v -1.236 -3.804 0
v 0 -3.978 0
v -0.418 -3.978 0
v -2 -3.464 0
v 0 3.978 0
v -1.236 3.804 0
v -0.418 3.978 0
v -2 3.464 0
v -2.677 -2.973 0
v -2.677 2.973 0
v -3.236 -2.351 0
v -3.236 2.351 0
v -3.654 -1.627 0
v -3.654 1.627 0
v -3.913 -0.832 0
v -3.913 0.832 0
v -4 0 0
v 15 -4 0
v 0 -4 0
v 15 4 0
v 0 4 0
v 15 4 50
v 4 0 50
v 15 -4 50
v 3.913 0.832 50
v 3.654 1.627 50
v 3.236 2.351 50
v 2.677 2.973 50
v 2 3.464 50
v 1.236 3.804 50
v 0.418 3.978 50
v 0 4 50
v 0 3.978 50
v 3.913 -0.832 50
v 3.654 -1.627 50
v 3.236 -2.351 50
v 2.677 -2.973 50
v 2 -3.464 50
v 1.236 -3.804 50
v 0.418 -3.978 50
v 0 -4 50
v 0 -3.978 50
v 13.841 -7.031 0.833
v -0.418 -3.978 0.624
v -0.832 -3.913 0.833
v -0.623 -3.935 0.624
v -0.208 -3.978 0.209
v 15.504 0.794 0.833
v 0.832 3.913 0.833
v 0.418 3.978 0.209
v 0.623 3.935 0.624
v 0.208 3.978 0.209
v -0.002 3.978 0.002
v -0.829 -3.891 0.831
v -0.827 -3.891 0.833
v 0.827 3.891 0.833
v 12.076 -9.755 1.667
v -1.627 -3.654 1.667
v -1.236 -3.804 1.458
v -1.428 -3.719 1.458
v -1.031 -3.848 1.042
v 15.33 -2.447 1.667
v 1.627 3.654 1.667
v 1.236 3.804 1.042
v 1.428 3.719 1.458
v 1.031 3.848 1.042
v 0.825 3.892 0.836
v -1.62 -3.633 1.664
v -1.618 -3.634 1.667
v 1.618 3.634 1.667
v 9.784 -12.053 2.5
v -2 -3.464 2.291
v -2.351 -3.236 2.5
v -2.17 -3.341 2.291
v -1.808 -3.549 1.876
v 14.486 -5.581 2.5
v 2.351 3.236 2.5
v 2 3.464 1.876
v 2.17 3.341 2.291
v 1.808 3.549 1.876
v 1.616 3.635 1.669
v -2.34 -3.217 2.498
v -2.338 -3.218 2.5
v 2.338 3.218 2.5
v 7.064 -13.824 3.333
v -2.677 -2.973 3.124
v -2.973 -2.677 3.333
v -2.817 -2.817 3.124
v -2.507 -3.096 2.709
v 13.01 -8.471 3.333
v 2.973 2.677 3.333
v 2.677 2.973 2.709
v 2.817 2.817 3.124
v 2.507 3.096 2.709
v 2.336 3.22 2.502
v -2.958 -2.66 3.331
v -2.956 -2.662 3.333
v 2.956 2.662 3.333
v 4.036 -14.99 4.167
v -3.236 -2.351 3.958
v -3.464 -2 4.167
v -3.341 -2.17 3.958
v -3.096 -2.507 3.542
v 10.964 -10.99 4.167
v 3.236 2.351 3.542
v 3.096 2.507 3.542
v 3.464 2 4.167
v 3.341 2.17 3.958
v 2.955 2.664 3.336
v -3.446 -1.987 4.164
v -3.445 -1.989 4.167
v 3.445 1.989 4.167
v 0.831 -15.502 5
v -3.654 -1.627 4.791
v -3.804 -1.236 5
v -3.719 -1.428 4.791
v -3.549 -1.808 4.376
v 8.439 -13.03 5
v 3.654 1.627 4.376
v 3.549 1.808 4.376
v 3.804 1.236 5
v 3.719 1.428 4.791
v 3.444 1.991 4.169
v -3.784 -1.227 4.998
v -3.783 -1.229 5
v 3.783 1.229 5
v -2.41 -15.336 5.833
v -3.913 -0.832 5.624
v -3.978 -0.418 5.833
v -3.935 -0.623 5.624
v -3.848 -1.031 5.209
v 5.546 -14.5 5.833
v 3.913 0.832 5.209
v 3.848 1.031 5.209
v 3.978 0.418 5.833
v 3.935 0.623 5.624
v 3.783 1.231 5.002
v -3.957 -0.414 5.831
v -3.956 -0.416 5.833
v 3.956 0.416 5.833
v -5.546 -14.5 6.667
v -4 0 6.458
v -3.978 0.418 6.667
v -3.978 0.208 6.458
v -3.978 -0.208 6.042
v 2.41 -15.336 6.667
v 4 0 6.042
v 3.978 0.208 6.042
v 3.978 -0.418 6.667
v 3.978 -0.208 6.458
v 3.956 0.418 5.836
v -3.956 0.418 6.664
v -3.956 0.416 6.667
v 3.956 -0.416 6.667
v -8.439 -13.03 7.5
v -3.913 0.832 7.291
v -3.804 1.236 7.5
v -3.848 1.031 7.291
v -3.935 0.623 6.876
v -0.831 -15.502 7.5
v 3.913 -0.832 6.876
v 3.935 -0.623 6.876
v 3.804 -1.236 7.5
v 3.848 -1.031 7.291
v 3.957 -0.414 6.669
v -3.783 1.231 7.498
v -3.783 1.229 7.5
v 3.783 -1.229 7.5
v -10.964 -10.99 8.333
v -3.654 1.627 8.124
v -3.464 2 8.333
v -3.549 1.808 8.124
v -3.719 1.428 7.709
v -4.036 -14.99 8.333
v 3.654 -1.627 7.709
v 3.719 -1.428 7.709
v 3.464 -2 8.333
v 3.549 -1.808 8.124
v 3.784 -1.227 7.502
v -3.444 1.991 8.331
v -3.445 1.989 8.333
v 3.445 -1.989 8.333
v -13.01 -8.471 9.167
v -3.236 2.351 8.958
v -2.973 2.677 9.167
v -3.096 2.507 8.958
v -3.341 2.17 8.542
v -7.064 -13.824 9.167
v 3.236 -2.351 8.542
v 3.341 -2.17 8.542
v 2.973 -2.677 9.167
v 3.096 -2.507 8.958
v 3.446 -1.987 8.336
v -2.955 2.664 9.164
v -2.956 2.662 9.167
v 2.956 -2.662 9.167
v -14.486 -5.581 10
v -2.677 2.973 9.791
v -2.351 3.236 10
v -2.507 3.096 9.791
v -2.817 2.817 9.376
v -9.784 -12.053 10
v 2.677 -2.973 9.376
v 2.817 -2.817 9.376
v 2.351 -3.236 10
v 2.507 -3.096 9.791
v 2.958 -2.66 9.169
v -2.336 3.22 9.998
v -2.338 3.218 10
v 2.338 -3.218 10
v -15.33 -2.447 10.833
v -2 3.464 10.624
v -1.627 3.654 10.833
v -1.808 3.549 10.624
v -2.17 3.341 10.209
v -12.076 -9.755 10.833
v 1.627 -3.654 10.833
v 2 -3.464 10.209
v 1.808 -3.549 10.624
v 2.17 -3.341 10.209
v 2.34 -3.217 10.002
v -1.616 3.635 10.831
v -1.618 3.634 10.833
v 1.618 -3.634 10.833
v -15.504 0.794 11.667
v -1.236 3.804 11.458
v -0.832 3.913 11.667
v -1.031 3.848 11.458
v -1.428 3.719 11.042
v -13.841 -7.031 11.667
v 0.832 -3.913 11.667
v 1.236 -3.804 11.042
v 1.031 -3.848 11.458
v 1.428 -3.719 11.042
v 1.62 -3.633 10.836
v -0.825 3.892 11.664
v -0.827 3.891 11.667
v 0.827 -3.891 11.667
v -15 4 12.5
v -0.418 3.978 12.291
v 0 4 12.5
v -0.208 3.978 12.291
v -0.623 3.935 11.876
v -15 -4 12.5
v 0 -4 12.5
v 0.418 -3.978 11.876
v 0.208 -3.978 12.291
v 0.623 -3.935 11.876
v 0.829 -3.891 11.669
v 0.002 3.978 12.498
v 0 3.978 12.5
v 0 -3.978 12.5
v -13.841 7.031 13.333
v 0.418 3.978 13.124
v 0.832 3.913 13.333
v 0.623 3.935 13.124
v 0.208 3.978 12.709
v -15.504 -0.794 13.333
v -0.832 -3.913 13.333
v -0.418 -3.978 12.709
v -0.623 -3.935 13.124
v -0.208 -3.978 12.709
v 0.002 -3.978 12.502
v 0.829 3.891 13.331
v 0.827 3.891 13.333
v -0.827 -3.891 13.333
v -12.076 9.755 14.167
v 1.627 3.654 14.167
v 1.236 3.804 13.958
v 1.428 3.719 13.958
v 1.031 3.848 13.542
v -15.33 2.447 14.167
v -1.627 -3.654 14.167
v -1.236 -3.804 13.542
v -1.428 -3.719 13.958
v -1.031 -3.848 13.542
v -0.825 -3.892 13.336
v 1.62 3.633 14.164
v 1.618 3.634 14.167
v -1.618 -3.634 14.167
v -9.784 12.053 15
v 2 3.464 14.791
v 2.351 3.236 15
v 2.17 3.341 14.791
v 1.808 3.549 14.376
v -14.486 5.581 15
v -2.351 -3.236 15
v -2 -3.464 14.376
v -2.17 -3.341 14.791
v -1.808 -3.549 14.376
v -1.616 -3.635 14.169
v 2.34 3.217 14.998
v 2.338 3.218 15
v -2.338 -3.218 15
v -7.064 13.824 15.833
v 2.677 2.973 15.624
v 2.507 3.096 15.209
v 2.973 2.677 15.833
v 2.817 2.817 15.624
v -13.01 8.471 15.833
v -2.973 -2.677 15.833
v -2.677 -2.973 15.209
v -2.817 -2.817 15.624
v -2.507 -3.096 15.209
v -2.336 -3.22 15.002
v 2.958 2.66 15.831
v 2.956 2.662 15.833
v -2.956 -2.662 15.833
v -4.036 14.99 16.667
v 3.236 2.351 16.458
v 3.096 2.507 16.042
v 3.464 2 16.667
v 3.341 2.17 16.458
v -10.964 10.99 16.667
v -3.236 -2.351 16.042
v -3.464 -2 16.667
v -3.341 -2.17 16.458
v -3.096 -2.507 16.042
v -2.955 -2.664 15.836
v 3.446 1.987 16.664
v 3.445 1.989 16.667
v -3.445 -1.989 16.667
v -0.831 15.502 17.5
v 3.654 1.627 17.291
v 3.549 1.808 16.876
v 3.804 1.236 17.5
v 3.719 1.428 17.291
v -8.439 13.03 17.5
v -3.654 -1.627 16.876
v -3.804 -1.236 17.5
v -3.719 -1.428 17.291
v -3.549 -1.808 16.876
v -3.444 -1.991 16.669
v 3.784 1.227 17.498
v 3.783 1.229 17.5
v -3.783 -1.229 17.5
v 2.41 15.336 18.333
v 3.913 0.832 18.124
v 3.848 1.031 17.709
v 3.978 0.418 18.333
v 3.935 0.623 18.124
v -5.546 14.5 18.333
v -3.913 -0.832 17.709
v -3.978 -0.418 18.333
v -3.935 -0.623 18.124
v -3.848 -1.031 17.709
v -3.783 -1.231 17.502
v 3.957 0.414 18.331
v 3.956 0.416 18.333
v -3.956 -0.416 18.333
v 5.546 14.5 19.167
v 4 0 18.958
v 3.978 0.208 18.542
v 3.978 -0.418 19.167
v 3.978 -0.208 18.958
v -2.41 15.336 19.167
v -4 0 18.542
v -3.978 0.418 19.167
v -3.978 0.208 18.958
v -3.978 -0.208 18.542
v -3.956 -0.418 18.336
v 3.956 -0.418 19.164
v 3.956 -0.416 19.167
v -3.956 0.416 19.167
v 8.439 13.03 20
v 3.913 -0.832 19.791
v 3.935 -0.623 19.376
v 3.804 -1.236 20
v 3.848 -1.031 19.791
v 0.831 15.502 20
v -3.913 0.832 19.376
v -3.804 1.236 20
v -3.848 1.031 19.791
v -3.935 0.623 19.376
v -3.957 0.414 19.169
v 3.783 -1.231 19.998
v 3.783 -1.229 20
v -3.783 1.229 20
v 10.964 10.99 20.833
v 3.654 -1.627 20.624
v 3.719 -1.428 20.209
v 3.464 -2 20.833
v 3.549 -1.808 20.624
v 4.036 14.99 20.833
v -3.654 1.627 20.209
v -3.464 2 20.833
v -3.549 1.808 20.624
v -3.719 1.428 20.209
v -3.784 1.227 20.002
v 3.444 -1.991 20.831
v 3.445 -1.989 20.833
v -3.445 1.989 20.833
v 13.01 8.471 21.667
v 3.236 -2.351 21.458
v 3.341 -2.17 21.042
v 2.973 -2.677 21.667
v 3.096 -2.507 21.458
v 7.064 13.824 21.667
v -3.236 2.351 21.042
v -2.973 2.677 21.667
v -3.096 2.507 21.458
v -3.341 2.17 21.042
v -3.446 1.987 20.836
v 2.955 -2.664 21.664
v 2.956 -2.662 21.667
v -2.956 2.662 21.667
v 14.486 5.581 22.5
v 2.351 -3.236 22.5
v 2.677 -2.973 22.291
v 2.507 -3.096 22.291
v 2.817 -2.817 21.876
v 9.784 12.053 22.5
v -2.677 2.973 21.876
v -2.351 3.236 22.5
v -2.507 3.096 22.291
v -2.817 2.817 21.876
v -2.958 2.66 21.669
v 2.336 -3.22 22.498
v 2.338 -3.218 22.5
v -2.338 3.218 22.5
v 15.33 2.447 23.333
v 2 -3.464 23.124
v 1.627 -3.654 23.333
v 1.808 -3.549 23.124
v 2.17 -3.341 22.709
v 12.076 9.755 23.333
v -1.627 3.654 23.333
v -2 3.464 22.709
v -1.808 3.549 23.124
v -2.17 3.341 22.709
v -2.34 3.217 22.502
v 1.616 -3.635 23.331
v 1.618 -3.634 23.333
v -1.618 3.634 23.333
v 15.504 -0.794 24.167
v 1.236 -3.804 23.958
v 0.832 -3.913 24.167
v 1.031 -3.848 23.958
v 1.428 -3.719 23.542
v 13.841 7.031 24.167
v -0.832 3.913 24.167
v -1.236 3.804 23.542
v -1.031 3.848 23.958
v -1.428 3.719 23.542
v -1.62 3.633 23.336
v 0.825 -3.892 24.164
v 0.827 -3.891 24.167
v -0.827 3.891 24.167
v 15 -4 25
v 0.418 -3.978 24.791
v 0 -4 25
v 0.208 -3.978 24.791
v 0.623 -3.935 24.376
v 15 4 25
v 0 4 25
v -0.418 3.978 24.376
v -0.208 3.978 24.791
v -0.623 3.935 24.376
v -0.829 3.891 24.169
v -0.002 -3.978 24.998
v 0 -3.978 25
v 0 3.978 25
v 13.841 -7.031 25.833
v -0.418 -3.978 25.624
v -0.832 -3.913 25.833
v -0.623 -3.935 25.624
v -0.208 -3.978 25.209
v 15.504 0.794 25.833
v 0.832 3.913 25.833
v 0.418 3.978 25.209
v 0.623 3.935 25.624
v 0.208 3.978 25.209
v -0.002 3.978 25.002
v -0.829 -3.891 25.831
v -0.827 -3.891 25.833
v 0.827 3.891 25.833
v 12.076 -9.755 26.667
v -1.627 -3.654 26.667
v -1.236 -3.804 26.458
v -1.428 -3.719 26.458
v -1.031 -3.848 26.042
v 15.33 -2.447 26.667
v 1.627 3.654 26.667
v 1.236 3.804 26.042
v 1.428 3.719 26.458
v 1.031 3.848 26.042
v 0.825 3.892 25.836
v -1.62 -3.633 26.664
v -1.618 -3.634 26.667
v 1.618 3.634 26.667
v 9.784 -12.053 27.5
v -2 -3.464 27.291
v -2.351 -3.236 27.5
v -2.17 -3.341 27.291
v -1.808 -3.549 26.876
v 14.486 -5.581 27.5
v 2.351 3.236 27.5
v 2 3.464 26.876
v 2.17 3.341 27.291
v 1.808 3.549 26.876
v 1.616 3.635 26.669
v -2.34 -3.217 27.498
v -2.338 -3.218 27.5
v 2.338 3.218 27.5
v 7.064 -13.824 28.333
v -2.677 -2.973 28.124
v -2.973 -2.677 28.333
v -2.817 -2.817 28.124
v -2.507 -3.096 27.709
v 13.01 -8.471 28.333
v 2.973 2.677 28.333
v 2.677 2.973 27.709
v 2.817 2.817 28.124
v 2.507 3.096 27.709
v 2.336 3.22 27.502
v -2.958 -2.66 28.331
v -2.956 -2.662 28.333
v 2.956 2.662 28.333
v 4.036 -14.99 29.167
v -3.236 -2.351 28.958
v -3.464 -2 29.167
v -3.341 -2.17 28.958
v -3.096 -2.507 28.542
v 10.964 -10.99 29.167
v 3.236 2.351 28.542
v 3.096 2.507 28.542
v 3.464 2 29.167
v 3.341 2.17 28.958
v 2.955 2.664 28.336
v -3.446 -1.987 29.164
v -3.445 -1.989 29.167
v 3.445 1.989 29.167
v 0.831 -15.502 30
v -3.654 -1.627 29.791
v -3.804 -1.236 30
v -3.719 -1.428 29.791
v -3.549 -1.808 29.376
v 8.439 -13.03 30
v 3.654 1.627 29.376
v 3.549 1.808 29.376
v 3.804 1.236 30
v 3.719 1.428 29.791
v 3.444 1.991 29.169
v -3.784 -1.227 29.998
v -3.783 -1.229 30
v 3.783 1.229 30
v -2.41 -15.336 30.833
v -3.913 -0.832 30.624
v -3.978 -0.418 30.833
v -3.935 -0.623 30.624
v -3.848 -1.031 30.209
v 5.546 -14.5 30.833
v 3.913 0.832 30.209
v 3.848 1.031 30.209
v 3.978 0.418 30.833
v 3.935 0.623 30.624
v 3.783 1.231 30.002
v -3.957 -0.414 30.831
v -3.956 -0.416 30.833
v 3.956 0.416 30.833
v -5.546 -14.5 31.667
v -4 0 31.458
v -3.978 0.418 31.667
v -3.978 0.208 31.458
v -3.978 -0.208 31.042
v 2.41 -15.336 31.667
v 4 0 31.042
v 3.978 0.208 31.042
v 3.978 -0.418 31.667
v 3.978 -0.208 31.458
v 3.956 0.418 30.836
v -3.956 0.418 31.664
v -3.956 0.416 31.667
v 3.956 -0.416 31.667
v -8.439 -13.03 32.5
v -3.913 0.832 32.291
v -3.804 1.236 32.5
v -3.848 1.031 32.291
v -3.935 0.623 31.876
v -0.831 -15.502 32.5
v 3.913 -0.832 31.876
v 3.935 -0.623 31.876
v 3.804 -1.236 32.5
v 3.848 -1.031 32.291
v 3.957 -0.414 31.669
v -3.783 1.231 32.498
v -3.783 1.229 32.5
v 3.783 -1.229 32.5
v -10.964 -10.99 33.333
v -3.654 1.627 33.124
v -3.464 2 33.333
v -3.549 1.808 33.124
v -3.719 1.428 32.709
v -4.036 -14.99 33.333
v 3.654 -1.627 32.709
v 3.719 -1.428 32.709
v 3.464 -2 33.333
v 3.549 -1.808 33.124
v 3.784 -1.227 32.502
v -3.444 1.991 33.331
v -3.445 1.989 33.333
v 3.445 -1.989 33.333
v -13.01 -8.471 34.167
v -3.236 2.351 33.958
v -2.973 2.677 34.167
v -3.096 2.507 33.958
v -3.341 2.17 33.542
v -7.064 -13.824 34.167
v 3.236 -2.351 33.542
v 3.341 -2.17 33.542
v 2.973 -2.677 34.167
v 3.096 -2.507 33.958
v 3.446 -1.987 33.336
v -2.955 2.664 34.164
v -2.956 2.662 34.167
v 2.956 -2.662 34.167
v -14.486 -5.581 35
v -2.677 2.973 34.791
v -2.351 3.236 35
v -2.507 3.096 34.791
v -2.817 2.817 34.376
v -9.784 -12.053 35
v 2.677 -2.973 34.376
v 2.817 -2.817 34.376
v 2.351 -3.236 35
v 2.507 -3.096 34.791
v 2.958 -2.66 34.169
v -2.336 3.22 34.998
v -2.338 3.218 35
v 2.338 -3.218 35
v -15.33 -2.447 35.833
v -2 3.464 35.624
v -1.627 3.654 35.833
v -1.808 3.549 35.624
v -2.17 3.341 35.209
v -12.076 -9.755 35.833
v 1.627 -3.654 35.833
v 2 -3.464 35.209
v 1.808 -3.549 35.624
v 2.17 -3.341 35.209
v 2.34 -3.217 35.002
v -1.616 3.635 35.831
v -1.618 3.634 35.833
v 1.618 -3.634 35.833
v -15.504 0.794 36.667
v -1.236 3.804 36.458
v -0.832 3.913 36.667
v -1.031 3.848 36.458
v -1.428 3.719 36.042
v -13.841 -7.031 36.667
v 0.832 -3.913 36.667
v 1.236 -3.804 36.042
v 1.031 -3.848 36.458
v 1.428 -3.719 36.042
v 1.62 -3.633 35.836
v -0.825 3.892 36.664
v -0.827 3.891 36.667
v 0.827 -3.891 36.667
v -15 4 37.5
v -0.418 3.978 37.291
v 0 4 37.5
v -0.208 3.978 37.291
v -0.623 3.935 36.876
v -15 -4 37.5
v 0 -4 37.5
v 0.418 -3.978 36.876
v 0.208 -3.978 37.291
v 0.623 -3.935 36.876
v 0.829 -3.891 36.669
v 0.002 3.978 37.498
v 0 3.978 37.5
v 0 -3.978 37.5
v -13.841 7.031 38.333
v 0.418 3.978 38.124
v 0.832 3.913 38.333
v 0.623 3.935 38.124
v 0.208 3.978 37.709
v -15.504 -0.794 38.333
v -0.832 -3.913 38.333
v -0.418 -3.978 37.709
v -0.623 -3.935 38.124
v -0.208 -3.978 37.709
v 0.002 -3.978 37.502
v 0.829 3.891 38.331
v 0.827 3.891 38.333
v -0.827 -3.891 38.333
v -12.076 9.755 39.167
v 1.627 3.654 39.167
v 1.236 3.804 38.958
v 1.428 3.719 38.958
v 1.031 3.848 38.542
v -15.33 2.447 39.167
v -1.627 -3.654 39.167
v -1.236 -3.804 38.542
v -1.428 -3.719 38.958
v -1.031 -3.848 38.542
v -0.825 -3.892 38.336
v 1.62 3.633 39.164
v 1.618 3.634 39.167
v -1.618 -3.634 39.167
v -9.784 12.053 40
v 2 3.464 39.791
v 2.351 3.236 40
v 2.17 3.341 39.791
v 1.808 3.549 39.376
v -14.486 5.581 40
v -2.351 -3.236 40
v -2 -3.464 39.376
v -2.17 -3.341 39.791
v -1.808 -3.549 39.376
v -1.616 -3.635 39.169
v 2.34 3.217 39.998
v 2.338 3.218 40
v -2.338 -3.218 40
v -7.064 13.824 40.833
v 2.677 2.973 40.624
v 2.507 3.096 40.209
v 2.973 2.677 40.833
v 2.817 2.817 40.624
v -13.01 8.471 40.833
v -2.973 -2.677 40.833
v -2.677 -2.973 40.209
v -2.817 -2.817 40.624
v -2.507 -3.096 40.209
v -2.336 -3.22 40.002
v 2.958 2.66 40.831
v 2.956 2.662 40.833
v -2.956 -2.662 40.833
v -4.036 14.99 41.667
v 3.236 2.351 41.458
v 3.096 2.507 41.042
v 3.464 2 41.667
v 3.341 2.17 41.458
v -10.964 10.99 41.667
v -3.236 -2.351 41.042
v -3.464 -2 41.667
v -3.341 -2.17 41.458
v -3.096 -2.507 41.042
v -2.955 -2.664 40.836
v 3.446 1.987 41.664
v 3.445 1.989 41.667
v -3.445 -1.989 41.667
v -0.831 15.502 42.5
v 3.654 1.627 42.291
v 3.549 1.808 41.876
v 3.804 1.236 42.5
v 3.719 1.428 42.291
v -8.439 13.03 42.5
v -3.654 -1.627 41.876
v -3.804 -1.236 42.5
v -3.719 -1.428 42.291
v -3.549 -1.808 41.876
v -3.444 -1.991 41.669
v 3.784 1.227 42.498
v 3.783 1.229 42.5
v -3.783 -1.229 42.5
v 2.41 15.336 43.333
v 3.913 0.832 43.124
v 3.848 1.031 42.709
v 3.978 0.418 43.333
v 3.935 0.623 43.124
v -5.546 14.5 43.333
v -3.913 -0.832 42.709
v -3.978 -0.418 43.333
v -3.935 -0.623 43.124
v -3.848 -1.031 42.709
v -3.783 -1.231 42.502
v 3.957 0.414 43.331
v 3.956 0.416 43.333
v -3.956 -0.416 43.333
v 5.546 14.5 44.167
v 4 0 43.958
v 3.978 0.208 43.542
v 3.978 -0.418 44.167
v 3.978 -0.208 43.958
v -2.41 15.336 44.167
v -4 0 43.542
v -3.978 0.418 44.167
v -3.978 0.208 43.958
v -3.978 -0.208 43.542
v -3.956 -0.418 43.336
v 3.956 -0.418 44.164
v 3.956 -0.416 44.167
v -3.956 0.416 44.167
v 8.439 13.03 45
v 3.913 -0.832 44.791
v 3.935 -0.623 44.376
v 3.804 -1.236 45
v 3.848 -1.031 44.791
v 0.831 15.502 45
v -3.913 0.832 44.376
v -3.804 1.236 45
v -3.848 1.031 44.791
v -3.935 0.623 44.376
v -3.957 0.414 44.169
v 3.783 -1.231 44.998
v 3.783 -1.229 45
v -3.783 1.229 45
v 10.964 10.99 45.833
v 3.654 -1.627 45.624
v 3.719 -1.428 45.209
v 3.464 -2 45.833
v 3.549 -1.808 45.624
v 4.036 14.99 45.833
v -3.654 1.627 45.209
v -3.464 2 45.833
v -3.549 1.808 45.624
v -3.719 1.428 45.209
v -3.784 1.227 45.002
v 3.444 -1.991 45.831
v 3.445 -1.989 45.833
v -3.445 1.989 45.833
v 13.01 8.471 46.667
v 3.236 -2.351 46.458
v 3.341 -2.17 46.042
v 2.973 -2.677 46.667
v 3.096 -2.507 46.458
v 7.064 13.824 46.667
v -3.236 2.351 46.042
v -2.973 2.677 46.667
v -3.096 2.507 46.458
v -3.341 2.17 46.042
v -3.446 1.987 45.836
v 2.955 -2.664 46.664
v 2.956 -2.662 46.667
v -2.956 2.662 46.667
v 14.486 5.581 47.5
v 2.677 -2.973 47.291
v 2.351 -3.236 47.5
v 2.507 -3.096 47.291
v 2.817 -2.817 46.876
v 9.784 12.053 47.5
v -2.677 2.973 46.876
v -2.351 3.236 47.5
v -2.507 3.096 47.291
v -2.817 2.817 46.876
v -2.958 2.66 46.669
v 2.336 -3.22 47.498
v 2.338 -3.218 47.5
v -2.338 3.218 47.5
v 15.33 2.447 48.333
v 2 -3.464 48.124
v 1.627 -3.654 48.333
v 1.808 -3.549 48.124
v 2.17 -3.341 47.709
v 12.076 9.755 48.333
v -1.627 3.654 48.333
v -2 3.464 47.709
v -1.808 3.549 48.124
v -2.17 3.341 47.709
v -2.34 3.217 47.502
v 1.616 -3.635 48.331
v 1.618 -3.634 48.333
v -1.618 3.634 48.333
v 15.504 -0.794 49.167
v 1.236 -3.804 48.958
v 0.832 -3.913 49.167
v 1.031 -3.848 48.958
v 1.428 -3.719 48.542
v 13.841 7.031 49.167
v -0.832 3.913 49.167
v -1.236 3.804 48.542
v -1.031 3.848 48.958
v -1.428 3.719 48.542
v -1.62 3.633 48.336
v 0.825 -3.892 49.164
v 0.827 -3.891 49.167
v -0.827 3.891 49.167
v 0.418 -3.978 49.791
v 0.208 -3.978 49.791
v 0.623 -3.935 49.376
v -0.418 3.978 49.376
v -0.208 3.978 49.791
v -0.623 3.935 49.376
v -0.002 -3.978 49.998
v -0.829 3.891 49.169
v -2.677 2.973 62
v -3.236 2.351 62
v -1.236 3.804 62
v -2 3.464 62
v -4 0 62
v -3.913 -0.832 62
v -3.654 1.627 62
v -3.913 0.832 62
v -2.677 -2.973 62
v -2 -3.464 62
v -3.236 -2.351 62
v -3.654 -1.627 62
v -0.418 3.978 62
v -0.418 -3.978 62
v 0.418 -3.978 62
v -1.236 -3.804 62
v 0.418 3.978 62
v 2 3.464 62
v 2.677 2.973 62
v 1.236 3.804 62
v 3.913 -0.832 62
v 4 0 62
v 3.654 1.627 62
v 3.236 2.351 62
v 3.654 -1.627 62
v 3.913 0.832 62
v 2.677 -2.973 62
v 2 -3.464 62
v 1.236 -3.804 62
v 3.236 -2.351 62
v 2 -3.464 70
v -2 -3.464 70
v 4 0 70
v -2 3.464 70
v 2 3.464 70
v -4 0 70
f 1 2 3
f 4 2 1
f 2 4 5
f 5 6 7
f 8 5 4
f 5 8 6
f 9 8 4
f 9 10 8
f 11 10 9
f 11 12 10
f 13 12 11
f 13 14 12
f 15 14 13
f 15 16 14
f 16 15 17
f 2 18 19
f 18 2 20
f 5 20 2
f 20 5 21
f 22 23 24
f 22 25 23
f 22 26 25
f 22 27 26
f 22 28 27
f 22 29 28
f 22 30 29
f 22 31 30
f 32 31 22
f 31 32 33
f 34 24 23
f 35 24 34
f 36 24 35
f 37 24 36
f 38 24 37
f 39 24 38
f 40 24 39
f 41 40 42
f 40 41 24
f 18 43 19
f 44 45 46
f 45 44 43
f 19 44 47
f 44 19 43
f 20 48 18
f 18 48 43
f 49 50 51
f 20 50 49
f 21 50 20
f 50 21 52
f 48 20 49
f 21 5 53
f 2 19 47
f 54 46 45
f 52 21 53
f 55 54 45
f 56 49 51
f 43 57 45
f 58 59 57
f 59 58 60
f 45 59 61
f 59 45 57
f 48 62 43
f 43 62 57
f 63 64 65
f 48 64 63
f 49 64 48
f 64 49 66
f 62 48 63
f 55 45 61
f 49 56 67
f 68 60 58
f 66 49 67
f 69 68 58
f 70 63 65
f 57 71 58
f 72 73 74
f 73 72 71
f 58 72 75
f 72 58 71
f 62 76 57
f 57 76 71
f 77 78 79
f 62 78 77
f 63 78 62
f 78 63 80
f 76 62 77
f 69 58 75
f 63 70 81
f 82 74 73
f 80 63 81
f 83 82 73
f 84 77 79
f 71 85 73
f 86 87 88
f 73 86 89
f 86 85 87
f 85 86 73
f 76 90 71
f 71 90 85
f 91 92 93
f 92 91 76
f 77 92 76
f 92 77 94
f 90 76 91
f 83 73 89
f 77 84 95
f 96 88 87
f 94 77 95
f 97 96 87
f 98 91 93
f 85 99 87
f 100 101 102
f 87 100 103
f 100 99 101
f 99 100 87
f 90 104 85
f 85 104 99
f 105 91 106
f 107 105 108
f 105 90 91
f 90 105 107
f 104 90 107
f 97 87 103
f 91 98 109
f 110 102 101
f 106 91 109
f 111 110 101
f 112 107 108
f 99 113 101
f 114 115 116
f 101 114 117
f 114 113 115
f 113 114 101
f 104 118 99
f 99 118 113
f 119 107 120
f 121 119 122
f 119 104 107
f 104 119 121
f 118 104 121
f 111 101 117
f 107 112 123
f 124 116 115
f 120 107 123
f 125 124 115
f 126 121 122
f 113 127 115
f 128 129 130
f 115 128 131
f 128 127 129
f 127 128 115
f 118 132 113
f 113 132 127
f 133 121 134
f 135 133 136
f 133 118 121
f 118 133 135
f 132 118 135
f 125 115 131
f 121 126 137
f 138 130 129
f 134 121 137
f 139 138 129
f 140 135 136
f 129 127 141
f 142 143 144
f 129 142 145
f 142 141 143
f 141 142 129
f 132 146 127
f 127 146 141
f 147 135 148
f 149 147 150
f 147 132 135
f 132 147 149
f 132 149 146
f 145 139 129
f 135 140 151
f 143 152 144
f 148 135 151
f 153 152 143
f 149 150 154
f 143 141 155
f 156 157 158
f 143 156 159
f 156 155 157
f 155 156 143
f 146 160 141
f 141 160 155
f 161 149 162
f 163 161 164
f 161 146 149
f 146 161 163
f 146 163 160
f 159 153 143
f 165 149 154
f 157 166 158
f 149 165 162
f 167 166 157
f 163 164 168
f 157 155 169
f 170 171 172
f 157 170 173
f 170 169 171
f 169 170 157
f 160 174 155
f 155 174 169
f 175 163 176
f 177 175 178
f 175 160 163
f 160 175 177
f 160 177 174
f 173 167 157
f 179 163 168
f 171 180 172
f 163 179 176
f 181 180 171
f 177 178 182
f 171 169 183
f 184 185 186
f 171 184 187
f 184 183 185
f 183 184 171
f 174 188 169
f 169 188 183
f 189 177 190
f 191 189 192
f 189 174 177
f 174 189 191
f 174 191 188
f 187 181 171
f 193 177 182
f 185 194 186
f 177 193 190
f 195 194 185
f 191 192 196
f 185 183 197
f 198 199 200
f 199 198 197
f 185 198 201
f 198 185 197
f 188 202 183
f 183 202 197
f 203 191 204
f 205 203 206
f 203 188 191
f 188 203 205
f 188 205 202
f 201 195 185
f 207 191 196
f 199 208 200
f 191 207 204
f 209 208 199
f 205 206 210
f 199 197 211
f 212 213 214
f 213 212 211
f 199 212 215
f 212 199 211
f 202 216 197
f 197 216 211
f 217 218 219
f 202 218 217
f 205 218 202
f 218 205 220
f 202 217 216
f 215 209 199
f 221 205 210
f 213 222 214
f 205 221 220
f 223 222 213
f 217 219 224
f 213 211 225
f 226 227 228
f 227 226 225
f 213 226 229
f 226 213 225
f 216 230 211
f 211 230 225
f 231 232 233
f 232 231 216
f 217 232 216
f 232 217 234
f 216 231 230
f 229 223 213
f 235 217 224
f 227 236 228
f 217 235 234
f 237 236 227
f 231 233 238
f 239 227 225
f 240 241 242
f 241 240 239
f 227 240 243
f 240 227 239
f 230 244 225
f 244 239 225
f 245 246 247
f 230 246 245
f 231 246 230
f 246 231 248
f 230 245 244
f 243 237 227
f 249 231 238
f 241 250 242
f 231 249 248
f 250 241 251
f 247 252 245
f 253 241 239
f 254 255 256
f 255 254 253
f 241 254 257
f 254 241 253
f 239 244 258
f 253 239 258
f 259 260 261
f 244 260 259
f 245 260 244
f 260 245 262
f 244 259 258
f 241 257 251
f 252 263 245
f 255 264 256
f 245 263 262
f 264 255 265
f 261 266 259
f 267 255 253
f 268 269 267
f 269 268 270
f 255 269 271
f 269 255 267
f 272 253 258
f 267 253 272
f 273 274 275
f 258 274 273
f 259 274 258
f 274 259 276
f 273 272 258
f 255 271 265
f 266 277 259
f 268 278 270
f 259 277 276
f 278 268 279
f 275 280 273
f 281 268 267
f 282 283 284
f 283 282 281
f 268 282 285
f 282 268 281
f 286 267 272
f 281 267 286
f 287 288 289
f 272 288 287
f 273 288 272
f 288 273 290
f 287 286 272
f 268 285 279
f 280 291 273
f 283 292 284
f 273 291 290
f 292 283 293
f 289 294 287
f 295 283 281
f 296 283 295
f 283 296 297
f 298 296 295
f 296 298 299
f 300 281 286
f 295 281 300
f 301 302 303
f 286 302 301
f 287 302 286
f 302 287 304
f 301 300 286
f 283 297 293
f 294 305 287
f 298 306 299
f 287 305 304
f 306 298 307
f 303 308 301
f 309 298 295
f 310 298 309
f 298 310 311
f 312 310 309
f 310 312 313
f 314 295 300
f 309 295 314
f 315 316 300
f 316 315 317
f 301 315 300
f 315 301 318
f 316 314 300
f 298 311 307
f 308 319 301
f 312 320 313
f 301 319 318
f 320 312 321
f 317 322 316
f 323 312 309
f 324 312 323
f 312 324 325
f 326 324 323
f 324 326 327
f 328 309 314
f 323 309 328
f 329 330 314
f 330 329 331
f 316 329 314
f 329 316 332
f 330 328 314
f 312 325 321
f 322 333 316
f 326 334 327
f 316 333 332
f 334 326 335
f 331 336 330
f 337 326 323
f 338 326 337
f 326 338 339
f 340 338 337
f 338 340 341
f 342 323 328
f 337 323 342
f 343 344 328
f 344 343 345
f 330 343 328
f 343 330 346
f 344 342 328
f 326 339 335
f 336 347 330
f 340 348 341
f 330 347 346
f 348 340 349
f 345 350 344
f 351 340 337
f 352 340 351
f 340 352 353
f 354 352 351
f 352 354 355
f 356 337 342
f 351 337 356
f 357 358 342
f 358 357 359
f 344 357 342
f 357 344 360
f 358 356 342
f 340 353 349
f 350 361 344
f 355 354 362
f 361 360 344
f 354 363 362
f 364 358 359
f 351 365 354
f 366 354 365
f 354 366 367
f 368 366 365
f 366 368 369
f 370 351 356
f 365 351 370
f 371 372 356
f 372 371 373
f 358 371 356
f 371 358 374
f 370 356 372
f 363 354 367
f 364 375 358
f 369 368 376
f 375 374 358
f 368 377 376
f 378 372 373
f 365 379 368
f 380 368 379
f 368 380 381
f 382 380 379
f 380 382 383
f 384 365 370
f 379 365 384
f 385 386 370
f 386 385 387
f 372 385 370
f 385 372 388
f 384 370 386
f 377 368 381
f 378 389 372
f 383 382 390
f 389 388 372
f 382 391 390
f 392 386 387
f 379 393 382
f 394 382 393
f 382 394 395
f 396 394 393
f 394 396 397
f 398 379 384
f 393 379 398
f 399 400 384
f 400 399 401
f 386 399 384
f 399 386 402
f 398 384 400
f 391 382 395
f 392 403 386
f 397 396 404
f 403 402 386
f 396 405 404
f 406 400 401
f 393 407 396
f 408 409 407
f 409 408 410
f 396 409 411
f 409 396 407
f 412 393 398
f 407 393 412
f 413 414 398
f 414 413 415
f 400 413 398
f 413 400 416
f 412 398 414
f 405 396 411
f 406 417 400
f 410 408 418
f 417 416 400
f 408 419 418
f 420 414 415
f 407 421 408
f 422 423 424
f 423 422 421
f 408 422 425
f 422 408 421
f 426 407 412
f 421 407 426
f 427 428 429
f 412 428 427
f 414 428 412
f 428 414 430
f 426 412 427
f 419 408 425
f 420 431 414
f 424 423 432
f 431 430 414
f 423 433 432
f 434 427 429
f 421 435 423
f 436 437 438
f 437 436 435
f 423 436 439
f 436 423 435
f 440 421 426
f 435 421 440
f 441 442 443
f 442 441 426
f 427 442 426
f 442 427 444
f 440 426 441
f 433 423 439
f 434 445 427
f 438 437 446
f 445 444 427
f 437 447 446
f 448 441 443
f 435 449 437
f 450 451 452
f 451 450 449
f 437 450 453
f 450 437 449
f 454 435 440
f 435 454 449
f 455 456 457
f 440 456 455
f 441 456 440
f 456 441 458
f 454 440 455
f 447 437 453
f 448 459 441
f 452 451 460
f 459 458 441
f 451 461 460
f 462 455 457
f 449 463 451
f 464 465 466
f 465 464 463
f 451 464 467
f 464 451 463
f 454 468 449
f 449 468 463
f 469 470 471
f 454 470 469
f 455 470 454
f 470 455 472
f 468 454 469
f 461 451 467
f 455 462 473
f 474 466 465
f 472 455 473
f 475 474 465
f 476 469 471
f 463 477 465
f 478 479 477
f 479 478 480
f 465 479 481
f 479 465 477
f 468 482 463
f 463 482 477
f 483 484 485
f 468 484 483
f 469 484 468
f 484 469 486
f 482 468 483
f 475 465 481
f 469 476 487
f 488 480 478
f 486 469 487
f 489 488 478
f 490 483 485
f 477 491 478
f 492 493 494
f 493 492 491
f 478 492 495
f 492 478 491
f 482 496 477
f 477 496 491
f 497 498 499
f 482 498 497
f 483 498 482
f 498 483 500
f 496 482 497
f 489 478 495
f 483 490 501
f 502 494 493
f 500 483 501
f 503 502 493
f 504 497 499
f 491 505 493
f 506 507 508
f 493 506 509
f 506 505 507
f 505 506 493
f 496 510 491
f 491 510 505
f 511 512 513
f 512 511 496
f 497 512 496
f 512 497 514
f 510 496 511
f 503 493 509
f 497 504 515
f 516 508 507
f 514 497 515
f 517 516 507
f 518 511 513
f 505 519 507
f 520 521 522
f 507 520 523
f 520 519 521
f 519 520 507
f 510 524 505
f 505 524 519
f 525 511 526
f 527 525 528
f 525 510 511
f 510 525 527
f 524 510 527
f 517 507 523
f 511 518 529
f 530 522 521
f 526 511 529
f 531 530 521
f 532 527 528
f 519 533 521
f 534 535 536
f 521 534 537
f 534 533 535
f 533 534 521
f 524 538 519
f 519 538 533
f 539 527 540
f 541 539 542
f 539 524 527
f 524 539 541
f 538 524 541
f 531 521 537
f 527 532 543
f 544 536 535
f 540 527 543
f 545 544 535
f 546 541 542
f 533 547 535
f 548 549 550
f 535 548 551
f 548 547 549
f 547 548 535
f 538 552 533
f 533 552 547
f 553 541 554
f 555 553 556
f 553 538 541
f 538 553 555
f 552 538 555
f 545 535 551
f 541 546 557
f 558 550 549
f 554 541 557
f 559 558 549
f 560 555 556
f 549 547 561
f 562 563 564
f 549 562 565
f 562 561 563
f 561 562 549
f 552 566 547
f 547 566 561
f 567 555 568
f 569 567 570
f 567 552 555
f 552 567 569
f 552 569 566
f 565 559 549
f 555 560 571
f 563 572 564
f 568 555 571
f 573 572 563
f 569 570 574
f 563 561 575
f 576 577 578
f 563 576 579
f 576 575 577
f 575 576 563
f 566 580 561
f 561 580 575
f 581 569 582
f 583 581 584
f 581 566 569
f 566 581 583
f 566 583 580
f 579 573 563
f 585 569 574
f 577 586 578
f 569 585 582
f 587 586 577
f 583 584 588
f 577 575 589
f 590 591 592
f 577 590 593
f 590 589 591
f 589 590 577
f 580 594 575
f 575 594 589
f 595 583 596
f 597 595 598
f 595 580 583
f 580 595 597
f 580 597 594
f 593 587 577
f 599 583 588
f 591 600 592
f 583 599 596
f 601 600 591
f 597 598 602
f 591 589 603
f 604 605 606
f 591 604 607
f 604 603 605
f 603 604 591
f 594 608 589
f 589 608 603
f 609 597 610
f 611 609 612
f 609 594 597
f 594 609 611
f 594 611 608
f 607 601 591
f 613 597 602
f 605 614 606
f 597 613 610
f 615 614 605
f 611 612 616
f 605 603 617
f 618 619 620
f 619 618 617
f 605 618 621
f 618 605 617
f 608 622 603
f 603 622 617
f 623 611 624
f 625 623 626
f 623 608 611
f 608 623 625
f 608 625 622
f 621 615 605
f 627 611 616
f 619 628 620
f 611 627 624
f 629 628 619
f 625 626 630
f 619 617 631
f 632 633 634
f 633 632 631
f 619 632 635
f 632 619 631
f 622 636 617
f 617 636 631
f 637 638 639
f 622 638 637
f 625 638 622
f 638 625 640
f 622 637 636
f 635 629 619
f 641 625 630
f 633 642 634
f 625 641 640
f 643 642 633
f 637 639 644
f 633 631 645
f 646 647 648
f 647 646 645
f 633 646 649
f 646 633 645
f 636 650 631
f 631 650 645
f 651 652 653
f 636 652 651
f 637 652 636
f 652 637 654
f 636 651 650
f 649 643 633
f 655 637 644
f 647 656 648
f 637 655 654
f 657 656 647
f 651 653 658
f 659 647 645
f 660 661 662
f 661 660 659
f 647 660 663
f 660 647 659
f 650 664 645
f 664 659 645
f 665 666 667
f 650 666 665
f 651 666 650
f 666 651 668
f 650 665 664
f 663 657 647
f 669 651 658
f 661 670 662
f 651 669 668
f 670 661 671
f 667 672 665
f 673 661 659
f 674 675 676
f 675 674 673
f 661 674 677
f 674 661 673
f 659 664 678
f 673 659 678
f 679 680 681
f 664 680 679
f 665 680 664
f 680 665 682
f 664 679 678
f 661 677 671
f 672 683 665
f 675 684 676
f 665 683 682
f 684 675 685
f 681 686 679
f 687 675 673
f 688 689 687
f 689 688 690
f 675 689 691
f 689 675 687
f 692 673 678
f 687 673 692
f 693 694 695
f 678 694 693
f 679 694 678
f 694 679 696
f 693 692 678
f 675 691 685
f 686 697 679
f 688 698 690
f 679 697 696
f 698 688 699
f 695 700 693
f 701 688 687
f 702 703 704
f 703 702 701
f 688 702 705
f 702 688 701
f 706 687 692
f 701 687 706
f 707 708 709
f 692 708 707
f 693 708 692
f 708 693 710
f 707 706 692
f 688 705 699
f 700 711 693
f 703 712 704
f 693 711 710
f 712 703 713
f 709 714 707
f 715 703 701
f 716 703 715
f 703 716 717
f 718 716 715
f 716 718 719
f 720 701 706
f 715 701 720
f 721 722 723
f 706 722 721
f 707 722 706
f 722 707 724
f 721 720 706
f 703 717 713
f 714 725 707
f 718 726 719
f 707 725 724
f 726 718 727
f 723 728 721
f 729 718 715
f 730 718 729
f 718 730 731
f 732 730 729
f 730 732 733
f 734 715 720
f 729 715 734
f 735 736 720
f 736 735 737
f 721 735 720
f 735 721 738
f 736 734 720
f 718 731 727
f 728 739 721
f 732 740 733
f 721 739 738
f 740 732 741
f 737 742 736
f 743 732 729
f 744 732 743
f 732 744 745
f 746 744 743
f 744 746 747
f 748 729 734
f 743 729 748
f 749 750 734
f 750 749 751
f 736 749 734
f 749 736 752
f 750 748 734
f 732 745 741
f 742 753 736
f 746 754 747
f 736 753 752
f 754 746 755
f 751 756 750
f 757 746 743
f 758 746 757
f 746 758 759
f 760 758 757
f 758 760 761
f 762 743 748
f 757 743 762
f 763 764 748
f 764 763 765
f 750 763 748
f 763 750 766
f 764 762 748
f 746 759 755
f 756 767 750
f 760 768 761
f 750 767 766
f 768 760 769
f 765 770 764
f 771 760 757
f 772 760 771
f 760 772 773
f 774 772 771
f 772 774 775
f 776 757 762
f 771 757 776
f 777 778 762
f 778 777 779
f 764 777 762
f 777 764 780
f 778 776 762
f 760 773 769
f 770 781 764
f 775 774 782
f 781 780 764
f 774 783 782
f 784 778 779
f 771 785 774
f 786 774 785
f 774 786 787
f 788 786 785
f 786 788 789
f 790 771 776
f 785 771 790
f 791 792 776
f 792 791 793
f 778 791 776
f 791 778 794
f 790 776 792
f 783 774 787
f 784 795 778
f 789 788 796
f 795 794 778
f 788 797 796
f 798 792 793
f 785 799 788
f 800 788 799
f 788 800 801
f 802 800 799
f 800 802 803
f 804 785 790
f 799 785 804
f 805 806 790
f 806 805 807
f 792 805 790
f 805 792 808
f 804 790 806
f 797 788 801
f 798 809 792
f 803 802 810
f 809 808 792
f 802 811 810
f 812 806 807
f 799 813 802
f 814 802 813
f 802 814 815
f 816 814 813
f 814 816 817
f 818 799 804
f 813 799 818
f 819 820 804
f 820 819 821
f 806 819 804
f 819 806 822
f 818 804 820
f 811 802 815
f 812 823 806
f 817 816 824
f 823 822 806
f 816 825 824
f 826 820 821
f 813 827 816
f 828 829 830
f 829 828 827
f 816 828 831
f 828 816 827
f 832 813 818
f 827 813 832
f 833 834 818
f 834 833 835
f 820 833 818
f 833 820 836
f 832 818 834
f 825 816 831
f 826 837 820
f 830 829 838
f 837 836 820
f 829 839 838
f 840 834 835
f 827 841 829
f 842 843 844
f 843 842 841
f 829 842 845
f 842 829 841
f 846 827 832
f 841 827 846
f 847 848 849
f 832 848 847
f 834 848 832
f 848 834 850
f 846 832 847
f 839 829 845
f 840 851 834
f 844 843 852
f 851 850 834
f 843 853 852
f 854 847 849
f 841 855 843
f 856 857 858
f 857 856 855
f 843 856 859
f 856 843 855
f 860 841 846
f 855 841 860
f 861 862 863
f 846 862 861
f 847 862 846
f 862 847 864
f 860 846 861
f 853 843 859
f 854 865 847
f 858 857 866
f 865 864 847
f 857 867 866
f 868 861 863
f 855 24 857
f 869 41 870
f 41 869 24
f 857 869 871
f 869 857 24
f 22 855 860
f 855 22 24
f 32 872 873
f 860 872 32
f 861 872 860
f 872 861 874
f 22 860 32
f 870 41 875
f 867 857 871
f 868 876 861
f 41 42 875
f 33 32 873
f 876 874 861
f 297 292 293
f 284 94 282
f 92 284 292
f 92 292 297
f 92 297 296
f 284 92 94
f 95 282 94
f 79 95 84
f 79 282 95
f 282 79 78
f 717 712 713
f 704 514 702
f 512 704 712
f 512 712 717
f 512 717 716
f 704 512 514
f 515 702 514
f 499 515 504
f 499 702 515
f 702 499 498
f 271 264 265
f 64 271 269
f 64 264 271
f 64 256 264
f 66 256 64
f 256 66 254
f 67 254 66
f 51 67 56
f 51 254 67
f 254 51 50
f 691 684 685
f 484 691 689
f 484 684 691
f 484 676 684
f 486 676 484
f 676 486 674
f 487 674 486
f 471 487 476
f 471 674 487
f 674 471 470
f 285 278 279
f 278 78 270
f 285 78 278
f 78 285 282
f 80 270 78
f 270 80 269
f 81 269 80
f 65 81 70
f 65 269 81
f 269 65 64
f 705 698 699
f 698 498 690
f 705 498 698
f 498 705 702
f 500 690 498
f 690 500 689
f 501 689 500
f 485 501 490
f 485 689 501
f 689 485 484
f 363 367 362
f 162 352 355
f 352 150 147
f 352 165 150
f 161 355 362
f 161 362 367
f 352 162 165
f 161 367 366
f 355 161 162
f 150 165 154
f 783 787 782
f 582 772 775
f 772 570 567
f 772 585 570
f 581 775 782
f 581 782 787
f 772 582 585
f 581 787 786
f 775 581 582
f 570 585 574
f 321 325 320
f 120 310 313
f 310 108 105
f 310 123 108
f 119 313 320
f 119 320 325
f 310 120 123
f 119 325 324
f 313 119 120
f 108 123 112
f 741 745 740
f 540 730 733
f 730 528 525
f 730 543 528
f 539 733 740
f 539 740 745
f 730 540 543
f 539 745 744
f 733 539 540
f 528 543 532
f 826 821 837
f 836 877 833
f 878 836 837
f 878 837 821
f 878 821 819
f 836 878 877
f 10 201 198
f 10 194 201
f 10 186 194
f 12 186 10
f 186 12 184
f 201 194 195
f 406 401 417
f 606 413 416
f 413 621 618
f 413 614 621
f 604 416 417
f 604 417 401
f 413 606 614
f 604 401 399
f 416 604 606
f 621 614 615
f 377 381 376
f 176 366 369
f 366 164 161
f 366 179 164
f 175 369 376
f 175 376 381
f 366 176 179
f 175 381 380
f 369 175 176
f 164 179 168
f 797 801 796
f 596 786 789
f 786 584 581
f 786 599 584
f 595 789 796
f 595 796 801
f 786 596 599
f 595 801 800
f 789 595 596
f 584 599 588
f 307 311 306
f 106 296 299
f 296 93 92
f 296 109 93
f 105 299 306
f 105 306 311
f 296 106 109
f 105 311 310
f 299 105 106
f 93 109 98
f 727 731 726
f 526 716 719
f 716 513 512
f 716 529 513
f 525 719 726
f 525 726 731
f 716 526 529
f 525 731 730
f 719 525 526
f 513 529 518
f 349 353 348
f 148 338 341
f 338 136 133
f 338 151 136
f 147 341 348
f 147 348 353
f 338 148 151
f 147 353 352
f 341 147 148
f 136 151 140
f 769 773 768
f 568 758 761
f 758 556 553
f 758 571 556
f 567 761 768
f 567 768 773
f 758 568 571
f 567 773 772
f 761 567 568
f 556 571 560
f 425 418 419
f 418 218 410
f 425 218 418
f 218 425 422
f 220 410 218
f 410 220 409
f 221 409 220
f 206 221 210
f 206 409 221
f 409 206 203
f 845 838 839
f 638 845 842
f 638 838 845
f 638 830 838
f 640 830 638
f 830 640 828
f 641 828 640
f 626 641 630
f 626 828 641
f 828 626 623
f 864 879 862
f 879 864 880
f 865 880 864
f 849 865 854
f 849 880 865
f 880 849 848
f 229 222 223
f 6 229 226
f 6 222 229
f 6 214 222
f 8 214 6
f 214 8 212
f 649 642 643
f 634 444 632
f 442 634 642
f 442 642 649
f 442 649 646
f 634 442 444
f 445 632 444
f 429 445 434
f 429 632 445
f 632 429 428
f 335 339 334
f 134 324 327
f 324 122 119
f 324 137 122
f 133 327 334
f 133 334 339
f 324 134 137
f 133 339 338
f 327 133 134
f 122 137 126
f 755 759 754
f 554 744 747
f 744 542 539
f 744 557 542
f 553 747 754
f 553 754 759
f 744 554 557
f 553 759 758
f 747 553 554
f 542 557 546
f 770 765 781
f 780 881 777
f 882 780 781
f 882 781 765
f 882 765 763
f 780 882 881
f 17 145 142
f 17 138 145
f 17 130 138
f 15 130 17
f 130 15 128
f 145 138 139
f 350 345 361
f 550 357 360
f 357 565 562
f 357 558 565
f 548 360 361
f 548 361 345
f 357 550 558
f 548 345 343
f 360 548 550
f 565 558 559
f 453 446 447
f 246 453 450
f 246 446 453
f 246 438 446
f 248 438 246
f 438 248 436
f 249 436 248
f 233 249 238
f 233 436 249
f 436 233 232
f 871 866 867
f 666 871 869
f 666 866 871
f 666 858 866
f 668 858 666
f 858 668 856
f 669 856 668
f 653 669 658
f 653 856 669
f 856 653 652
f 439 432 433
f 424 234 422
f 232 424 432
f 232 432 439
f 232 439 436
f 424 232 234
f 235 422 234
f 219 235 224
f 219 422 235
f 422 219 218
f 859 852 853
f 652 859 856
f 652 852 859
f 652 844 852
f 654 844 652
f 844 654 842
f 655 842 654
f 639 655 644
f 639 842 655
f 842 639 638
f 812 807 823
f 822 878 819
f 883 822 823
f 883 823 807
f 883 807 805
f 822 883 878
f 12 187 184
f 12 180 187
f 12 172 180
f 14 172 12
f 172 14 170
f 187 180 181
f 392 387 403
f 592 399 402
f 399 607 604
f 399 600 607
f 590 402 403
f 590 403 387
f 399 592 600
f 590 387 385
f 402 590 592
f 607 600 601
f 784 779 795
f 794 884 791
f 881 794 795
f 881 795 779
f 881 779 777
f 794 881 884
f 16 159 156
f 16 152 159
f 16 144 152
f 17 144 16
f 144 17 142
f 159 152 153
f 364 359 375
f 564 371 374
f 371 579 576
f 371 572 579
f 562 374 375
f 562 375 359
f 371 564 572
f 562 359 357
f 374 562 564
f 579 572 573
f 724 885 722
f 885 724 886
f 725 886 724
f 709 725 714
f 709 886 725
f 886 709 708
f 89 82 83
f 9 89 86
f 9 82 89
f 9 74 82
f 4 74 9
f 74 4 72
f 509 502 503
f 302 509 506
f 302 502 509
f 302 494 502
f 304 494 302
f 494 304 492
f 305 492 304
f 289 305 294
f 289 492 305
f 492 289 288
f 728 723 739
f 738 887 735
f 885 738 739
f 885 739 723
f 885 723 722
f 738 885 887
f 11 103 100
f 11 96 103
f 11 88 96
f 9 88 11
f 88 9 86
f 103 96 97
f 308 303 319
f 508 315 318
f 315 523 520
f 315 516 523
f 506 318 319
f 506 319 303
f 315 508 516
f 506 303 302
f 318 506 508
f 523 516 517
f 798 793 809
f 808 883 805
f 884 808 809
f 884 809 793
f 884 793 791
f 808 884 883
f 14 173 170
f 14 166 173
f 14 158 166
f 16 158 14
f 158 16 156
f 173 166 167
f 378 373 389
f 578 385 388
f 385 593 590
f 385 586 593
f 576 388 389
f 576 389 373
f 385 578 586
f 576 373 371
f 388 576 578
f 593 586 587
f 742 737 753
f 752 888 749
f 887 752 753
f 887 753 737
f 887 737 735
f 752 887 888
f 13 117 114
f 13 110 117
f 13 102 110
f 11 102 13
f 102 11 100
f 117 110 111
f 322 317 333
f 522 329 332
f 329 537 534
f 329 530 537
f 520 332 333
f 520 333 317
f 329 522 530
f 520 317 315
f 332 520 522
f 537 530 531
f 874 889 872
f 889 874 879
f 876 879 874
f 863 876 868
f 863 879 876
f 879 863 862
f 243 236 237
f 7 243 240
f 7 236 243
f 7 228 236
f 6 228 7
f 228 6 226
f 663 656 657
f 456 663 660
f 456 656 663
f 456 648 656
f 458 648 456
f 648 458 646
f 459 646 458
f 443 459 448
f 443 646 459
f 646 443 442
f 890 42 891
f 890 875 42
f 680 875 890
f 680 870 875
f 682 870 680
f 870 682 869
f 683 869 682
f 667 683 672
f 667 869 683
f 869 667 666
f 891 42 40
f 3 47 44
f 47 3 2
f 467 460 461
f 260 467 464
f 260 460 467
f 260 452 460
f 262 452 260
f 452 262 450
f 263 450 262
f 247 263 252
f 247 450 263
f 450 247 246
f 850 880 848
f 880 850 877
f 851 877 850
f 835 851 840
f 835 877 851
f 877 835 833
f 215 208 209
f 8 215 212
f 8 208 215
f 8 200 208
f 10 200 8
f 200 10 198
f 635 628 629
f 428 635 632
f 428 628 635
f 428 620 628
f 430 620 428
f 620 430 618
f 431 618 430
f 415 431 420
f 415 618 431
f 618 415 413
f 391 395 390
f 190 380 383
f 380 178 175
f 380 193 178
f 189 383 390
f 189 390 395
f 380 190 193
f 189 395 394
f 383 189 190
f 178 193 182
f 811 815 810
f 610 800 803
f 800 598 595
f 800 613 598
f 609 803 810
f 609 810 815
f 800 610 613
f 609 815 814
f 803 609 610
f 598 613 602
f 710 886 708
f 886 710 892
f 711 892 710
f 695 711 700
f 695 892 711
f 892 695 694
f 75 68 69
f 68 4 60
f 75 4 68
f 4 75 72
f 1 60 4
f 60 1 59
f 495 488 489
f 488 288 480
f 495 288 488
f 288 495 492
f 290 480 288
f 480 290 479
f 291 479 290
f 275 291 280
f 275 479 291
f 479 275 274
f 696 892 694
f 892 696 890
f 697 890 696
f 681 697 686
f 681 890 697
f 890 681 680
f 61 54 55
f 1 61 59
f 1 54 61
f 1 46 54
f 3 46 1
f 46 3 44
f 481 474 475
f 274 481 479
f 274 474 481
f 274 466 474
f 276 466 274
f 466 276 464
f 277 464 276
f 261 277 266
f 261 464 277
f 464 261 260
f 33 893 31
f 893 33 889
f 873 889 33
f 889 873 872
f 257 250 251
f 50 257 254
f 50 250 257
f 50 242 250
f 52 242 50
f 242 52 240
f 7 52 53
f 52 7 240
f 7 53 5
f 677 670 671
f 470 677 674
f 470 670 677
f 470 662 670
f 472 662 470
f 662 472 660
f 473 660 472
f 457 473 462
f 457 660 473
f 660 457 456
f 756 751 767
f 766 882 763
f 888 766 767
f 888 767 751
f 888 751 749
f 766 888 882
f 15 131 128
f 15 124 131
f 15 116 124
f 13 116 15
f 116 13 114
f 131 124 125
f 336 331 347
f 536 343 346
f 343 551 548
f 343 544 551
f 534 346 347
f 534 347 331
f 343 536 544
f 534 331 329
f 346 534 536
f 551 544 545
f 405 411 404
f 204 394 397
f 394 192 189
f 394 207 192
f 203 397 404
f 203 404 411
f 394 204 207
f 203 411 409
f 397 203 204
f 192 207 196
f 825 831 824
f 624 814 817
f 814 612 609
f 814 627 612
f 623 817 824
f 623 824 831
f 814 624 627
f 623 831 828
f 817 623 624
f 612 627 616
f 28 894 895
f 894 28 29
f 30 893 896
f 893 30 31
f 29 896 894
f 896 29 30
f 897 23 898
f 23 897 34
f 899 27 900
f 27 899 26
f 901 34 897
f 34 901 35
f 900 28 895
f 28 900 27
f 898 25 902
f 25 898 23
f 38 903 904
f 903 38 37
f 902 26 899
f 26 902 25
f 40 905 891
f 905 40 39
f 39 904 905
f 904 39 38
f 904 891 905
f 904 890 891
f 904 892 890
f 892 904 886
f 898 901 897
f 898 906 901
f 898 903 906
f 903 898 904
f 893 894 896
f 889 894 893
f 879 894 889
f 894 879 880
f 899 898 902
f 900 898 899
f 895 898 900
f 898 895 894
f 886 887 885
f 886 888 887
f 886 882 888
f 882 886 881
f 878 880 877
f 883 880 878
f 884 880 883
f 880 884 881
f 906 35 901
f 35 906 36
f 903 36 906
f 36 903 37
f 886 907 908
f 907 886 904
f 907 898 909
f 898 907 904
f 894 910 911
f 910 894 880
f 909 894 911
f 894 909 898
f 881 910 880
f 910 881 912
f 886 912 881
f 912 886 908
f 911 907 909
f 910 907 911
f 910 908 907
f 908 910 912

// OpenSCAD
AUGER_CENTER_DIA = 8;
AUGER_DIA = 30;
AUGER_TWIST = 720;
AUGER_HEIGHT = 50;

SHAFT_LENGTH = 20;
SHAFT_MOUNT_LENGTH = 8;
SHAFT_DIA = AUGER_CENTER_DIA;

CIRCULAR = false;


$fn = 30;

module auger() {
  union() {
    linear_extrude(height = AUGER_HEIGHT, twist = AUGER_TWIST)
    translate([AUGER_DIA/4, 0, 0])
    if(!CIRCULAR) {
      square([AUGER_DIA/2, AUGER_CENTER_DIA], center = true);
    } else {
      circle(d = AUGER_DIA/2);
    }
    cylinder(d = AUGER_CENTER_DIA, h = AUGER_HEIGHT);
  }
}

module shaft() {
  union() {
    cylinder(d = SHAFT_DIA, h = SHAFT_LENGTH - SHAFT_MOUNT_LENGTH);
    translate([0, 0, SHAFT_LENGTH - SHAFT_MOUNT_LENGTH])
    cylinder(d = SHAFT_DIA, h = SHAFT_MOUNT_LENGTH, $fn = 6);
  }
}

union() {
  auger();
  translate([0, 0, AUGER_HEIGHT])
  shaft();
}
